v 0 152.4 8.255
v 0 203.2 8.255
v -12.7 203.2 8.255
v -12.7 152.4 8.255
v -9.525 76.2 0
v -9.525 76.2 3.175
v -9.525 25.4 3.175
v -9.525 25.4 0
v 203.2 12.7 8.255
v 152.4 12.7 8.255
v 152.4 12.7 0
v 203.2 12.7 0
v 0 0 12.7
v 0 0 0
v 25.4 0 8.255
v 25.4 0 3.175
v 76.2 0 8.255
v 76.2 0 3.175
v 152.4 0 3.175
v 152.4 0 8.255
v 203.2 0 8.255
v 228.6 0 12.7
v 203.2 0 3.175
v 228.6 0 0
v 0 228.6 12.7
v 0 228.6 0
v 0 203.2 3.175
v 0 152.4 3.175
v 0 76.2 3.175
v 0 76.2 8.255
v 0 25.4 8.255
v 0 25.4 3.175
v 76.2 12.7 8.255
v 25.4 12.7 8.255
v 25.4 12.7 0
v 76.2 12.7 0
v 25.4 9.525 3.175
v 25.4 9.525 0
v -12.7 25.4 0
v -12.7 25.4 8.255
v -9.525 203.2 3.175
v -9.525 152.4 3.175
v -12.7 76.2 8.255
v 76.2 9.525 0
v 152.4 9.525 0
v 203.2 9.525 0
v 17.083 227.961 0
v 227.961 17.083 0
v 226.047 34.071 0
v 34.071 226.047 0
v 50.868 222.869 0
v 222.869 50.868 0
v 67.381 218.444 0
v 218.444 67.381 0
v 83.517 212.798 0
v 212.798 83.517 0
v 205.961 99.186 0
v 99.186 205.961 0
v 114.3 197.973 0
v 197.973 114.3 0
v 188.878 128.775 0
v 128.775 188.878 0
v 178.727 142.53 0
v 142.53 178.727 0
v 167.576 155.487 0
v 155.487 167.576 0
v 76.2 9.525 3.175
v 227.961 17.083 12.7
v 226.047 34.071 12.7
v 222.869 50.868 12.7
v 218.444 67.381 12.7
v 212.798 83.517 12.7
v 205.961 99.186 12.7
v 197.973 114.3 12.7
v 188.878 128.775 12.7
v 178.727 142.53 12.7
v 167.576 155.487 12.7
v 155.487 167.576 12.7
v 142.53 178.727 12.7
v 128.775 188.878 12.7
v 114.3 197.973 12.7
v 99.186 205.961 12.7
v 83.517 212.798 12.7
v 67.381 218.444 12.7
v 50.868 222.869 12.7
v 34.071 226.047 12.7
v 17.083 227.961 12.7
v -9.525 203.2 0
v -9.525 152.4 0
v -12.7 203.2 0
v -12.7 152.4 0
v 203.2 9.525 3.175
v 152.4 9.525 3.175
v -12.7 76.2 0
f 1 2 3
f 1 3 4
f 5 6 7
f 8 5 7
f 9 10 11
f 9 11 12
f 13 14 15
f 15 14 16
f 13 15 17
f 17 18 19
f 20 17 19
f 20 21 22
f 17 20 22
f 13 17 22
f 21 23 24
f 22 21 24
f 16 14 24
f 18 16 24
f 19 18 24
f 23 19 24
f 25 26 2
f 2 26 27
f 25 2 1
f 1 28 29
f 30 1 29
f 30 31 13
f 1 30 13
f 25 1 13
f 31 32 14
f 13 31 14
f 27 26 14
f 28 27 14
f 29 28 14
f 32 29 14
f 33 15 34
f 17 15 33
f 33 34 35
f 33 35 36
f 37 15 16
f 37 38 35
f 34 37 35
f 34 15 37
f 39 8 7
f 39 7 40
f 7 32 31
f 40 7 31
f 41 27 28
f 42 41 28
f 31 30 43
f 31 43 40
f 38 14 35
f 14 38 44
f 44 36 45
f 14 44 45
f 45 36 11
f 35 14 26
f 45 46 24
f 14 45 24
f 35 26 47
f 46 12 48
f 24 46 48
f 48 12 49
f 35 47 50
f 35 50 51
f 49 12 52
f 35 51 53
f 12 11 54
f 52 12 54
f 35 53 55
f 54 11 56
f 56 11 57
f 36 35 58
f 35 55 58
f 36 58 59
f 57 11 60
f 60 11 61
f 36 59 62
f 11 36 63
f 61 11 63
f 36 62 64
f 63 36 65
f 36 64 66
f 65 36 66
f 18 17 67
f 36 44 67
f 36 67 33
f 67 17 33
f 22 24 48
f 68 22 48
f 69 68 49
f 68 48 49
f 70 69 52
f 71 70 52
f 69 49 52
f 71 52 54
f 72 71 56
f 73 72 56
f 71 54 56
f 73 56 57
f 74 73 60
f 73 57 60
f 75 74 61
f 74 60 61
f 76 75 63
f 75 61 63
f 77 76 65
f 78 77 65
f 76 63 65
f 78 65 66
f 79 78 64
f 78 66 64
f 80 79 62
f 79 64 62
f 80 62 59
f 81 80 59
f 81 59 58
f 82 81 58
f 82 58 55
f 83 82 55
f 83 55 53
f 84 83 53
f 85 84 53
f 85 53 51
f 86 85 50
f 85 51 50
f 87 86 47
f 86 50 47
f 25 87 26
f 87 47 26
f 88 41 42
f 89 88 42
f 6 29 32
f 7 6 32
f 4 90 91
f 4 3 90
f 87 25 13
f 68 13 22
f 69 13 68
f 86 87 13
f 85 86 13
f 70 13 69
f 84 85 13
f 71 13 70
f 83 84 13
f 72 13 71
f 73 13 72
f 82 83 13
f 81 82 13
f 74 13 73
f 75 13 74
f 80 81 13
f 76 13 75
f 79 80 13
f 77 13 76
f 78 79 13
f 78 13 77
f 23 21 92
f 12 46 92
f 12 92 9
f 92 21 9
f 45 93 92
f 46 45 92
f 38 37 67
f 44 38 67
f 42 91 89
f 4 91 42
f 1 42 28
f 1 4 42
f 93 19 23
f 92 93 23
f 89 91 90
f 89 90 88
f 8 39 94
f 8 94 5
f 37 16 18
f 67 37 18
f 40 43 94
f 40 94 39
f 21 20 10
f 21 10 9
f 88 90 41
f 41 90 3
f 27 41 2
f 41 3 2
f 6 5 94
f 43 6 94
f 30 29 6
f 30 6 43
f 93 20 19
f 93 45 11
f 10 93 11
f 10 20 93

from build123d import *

# Parameters (mm, degrees)
F1_DEPTH = 12.7
F2_W     = 50.8
F2_H     = 5.08
F3_DEPTH = 12.7
F4_W     = 50.8
F4_H     = 5.08
F5_DEPTH = 12.7
F6_W     = 50.8
F6_H     = 3.175
F7_DEPTH = 3.176
F8_W     = 3.175
F8_H     = 50.8
F9_DEPTH = 3.175


with BuildPart() as f1:
    # F0 (on Top) → F1 (new body)
    with BuildSketch(Plane.XY):
        with BuildLine():
            Line((0, 228.6), (0, 0))
            Line((0, 0), (228.6, 0))
            ThreePointArc((228.6, 0), (161.64461, 161.64461), (0, 228.6))
        make_face()
    extrude(amount=F1_DEPTH)

    # F2 (on face) → F3 (cut)
    with BuildSketch(Plane.XZ):
        with Locations((50.8, 5.715)):
            Rectangle(F2_W, F2_H)
        with Locations((177.8, 5.715)):
            Rectangle(F2_W, F2_H)
    extrude(amount=-F3_DEPTH, mode=Mode.SUBTRACT)

    # F4 (on face) → F5 (join)
    with BuildSketch(Plane(origin=(0, 0, 0), x_dir=(0, -1, 0), z_dir=(-1, 0, 0))):
        with Locations((-50.8, 5.715)):
            Rectangle(F4_W, F4_H)
        with Locations((-177.8, 5.715)):
            Rectangle(F4_W, F4_H)
    extrude(amount=F5_DEPTH)

    # F6 (on face) → F7 (cut, through all)
    with BuildSketch(Plane.XY.offset(3.175)):
        with Locations((50.8, 11.1125)):
            Rectangle(F6_W, F6_H)
        with Locations((177.8, 11.1125)):
            Rectangle(F6_W, F6_H)
    extrude(amount=-F7_DEPTH, mode=Mode.SUBTRACT)

    # F8 (on face) → F9 (join)
    with BuildSketch(Plane(origin=(0, 0, 3.175), x_dir=(1, 0, 0), z_dir=(0, 0, -1))):
        with Locations((-11.1125, -177.8)):
            Rectangle(F8_W, F8_H)
        with Locations((-11.1125, -50.8)):
            Rectangle(F8_W, F8_H)
    extrude(amount=F9_DEPTH)


solid = f1.part
